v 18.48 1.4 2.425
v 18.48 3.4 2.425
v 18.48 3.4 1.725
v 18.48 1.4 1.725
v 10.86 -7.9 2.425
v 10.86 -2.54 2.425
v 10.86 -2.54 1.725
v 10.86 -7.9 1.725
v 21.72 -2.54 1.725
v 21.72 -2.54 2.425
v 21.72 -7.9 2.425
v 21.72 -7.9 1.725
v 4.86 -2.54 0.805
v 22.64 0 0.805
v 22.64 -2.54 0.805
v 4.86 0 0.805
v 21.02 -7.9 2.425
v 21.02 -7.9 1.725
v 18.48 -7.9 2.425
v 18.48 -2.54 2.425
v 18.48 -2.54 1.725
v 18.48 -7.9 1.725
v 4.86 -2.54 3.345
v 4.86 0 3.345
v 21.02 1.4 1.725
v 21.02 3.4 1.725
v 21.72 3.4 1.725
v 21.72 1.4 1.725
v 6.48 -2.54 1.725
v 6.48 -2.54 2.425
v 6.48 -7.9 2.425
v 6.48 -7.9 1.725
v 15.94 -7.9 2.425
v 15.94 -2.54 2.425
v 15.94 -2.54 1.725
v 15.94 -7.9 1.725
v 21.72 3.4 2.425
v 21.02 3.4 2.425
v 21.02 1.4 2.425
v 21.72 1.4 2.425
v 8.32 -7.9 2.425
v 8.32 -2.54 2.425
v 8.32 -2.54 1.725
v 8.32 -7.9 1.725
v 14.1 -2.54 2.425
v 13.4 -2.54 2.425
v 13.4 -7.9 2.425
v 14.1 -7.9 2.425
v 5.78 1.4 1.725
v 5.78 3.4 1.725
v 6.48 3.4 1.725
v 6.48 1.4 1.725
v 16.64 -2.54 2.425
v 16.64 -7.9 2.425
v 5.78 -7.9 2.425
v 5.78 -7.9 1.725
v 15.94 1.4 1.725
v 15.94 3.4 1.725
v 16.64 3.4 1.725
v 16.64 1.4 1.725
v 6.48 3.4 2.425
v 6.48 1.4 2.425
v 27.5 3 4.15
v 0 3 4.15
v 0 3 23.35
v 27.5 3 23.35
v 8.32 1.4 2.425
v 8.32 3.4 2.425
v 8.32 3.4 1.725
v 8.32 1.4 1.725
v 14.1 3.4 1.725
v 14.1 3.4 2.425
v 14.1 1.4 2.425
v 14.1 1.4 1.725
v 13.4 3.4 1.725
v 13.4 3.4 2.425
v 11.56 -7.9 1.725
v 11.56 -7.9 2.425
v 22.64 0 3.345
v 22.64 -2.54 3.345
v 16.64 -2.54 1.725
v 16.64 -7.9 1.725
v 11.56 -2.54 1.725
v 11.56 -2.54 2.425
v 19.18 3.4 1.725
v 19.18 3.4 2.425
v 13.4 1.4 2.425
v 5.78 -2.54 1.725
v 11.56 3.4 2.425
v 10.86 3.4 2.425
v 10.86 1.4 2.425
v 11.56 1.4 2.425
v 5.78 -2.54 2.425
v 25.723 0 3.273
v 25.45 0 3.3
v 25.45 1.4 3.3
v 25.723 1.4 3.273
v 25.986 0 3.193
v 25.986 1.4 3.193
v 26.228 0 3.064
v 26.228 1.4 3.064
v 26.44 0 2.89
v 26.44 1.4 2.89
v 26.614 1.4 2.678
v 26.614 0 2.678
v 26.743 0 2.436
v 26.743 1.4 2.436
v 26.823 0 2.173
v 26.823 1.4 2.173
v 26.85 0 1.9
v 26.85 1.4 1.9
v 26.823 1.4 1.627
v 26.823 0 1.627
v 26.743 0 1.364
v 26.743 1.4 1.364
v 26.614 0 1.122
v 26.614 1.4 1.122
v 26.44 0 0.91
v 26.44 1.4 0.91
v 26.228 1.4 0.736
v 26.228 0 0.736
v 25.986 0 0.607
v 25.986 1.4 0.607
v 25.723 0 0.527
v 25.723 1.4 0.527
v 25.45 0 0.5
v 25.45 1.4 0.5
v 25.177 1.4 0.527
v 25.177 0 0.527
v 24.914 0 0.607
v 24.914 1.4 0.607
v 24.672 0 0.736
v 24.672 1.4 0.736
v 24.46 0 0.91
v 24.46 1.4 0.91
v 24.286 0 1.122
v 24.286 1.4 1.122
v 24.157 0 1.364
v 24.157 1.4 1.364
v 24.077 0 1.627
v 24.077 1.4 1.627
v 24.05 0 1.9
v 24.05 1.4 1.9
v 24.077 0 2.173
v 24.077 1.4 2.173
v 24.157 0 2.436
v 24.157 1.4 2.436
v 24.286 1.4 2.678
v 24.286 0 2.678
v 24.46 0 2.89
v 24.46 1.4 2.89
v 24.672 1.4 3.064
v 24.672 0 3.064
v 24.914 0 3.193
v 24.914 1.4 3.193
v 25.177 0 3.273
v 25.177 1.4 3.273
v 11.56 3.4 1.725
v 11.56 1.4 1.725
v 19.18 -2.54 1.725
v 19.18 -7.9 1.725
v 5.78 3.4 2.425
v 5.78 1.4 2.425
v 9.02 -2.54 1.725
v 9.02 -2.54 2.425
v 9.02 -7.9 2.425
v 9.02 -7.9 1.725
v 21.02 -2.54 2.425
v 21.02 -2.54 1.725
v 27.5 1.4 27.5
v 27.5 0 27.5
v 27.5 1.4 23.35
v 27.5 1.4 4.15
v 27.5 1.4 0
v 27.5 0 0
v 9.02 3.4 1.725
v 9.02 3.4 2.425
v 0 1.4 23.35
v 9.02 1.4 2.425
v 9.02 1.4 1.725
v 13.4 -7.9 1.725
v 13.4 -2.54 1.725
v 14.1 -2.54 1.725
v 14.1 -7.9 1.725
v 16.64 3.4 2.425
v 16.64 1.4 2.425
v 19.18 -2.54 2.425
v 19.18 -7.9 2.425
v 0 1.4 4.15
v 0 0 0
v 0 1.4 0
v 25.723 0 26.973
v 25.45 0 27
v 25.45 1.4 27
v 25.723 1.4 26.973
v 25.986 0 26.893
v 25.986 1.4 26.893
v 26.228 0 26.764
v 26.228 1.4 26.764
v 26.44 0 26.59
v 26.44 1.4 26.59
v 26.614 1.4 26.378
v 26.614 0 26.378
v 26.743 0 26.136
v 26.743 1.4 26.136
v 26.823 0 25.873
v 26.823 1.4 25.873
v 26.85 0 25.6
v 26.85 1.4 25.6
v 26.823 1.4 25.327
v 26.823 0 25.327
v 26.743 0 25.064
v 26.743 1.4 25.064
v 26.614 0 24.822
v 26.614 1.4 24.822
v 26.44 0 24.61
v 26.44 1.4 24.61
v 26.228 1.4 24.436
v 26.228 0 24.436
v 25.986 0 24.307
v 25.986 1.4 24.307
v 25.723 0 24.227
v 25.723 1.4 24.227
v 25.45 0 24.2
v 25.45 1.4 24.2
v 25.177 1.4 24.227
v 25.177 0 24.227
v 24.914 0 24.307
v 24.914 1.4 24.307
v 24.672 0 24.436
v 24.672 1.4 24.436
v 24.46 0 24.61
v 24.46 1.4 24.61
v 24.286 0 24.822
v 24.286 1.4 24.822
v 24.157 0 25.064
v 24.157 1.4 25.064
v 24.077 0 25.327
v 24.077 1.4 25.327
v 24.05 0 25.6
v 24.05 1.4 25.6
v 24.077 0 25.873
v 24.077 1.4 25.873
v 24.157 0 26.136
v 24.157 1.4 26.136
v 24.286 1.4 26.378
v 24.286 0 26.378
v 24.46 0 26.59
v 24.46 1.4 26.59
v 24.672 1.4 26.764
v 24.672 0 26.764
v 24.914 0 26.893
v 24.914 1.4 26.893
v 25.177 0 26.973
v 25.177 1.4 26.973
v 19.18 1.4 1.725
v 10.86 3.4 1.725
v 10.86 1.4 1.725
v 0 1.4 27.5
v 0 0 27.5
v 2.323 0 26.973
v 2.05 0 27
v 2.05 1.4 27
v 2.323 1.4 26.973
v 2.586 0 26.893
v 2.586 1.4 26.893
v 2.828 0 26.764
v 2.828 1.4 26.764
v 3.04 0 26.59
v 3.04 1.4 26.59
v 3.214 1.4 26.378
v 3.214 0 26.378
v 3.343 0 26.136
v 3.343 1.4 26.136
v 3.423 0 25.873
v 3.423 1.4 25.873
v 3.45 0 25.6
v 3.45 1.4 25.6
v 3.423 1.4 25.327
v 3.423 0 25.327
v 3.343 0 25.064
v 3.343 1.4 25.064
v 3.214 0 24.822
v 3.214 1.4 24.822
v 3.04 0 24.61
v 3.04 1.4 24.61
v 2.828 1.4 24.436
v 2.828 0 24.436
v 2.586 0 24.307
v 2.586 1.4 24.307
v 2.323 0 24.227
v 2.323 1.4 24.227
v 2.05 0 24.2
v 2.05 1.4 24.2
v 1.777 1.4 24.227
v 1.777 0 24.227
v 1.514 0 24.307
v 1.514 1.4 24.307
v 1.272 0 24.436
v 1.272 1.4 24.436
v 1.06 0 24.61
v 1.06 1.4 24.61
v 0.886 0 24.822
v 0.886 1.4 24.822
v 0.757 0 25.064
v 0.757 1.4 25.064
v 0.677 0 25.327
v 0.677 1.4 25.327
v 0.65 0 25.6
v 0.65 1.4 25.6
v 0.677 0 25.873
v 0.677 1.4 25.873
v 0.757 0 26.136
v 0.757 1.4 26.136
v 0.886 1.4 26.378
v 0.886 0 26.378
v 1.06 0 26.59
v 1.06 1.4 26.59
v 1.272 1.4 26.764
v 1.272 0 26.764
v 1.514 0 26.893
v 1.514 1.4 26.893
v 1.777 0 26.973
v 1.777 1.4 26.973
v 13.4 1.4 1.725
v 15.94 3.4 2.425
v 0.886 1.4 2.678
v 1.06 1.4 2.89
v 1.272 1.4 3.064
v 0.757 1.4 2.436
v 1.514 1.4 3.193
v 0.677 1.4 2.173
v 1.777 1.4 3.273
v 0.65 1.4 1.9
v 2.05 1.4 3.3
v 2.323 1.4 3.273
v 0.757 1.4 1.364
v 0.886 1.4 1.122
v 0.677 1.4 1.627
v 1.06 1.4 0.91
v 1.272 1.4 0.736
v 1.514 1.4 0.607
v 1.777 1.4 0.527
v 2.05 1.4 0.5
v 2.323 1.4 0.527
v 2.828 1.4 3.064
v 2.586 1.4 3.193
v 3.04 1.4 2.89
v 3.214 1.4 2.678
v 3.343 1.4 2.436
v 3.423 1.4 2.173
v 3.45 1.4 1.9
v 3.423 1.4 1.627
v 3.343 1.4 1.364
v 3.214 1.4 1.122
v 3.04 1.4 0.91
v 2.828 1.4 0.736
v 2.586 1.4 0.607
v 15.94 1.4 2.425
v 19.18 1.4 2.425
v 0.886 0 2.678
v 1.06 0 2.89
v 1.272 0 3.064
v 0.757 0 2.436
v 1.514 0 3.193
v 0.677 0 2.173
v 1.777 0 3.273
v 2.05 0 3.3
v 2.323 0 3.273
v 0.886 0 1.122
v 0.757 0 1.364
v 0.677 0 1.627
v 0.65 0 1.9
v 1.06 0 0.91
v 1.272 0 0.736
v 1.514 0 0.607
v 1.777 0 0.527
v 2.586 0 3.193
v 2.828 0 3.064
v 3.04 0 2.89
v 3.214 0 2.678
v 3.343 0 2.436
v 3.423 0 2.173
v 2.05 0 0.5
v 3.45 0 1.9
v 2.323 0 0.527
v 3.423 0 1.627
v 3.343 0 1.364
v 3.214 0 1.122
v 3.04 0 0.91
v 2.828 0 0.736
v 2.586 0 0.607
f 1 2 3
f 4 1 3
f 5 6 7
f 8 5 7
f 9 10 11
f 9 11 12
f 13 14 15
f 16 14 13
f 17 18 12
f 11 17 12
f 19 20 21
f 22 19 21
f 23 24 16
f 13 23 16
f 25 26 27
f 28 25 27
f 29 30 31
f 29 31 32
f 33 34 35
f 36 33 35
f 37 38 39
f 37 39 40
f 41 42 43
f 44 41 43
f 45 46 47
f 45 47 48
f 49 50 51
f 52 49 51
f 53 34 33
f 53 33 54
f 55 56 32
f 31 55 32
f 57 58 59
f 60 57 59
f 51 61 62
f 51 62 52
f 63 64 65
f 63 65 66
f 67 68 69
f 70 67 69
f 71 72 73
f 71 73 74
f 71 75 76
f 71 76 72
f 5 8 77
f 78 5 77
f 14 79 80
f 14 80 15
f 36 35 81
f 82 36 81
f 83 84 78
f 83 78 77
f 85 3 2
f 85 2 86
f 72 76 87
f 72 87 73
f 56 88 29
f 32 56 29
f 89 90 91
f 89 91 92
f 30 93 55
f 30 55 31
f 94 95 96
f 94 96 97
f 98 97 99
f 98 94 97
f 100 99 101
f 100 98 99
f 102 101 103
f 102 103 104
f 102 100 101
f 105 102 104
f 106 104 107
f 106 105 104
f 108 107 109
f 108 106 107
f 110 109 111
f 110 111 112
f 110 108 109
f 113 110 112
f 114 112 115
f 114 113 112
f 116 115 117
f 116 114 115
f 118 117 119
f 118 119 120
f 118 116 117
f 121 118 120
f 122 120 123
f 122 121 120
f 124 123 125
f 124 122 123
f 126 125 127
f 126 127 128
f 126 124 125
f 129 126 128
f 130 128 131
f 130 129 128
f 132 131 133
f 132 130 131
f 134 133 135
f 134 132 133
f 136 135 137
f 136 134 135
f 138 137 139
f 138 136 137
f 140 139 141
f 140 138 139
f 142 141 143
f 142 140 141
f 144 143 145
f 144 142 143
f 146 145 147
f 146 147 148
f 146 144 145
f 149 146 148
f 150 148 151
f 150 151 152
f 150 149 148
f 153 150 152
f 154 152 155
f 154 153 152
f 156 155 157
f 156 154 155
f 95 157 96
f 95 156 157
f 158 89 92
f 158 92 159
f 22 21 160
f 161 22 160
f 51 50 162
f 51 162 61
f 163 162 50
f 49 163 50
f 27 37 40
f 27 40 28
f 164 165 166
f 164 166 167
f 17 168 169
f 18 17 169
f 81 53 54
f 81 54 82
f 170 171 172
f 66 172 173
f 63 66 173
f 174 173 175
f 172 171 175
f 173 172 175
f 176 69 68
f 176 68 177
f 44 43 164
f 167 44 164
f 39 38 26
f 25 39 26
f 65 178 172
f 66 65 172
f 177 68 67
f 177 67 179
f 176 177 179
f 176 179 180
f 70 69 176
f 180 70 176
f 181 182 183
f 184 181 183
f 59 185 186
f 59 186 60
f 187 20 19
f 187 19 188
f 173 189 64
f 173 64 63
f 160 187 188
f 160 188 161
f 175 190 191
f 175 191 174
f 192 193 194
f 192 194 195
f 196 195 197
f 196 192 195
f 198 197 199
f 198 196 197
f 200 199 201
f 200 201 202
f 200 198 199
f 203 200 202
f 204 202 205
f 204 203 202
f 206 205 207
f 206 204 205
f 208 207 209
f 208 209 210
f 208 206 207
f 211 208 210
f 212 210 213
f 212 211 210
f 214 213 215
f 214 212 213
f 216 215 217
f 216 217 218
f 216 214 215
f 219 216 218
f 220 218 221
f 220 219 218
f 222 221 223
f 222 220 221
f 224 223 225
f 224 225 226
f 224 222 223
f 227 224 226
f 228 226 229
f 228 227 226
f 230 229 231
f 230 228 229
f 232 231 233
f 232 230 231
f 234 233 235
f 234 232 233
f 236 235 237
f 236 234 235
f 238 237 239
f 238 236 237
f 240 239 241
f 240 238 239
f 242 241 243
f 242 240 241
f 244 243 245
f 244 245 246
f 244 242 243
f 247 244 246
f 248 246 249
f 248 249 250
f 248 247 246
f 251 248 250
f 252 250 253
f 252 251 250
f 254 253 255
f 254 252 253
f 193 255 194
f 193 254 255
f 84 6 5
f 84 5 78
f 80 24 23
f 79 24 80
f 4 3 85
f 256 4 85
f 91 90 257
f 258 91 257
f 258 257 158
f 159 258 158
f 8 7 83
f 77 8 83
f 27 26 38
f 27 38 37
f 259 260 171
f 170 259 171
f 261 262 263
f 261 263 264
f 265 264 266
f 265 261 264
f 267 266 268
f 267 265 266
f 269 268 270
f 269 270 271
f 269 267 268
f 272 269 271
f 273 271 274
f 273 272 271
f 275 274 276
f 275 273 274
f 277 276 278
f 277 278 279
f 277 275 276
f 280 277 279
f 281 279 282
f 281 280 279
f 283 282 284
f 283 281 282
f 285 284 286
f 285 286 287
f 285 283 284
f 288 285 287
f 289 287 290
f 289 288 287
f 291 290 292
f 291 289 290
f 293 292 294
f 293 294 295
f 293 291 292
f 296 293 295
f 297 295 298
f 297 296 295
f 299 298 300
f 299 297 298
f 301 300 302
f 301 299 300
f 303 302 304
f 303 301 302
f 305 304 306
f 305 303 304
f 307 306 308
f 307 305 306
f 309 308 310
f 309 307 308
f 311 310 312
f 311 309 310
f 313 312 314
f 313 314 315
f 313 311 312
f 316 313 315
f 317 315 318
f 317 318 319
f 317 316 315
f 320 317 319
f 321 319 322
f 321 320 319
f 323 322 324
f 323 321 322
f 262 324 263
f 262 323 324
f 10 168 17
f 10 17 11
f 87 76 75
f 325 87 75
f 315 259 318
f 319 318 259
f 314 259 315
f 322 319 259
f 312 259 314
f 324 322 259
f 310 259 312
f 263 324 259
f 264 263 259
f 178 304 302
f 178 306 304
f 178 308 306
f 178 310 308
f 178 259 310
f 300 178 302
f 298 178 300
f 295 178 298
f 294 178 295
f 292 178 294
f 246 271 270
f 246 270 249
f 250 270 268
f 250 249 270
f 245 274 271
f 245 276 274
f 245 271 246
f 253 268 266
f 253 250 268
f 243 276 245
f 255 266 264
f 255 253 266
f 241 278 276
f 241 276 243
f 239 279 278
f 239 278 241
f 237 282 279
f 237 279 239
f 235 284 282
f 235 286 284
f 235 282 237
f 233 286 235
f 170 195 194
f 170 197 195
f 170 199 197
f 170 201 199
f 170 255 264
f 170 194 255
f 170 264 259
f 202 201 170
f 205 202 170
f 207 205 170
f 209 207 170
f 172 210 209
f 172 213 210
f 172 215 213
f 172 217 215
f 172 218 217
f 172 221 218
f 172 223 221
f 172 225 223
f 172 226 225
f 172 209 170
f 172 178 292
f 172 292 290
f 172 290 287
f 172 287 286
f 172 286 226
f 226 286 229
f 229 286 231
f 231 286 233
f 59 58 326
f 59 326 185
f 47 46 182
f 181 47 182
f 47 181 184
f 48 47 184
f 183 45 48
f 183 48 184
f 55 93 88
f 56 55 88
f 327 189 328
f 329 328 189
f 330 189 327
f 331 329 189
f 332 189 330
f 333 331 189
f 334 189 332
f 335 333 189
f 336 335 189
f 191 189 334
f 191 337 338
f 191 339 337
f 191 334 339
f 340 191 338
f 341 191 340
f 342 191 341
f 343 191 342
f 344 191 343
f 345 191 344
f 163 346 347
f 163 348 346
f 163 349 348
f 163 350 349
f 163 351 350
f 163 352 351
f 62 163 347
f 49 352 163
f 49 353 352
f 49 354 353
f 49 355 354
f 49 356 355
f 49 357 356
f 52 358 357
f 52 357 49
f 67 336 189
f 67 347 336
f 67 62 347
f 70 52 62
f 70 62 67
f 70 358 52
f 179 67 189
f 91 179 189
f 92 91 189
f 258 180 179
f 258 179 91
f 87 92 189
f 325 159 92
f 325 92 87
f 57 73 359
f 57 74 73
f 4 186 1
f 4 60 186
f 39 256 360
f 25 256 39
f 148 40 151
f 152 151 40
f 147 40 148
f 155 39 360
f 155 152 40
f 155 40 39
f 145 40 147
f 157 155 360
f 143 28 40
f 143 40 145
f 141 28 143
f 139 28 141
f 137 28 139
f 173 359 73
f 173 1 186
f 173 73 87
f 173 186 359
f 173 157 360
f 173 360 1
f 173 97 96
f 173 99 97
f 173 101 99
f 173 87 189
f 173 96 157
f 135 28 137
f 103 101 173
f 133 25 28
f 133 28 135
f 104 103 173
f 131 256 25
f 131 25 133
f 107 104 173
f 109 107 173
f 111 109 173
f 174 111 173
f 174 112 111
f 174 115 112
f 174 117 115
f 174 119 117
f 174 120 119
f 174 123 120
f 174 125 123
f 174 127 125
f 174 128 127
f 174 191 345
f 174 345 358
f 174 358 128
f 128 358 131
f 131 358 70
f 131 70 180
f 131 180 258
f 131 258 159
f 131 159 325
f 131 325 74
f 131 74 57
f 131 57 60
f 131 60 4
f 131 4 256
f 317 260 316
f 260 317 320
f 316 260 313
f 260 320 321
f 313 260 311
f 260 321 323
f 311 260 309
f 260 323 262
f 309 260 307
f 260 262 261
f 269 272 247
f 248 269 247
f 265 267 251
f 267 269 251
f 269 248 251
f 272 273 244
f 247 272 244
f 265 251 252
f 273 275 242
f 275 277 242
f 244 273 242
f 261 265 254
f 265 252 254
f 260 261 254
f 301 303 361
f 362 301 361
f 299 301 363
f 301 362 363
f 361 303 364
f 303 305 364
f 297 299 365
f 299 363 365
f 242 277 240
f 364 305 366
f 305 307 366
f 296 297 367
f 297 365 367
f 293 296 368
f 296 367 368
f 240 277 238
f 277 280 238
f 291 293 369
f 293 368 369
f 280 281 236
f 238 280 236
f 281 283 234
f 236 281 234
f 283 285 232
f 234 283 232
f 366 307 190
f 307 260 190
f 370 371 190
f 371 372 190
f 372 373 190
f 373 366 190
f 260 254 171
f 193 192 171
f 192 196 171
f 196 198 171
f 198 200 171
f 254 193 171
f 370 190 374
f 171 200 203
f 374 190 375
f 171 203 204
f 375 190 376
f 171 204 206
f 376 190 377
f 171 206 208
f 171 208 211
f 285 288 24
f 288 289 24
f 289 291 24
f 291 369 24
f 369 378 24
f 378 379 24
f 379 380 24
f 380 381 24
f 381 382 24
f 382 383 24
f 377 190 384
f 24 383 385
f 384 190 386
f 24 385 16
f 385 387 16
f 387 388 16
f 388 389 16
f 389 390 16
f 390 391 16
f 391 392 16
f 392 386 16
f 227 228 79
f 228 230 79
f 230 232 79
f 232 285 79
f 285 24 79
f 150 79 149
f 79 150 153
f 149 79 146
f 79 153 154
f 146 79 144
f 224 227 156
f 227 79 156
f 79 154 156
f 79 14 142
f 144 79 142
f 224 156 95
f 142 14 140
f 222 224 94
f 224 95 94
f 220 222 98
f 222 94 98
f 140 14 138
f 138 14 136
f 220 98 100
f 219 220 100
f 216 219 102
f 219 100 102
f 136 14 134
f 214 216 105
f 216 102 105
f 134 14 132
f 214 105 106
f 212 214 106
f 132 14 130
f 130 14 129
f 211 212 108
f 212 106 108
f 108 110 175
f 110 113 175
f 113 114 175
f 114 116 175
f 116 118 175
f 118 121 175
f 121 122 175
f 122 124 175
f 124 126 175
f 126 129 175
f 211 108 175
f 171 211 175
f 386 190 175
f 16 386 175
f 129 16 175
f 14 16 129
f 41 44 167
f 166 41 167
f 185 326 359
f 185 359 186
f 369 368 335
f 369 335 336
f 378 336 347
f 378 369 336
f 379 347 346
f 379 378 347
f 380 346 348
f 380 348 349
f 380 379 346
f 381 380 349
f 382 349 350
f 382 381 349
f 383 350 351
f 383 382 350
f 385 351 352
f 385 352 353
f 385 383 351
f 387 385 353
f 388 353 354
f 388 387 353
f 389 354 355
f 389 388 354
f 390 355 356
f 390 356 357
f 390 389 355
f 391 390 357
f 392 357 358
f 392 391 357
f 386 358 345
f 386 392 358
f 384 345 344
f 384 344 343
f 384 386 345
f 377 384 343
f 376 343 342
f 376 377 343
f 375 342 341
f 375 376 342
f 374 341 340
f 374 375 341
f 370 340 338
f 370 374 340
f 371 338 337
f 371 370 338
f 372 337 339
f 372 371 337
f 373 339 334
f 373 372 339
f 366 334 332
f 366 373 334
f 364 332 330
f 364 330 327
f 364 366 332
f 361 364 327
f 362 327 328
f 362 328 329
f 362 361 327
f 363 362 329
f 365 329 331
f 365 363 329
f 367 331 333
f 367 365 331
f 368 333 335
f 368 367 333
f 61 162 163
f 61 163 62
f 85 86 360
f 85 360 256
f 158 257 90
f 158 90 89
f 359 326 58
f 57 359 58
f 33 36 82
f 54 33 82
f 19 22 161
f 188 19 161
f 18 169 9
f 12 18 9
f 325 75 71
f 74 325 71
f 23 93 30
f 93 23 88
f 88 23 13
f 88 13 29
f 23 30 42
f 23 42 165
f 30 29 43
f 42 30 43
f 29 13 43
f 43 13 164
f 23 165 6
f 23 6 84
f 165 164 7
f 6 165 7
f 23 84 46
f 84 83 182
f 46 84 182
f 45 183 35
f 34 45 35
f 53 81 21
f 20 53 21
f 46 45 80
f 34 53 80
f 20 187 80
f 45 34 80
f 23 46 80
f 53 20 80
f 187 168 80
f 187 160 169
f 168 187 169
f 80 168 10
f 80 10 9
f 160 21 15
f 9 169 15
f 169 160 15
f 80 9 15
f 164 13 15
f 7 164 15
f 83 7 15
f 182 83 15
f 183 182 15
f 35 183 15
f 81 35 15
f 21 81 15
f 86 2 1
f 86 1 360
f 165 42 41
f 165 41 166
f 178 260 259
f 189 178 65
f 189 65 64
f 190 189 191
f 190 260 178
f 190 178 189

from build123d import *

# Parameters (mm, degrees)
SKETCH_1_W      = 27.5
SKETCH_1_H      = 27.5
SKETCH_1_R      = 1.4
EXTRUDE_1_DEPTH = 1.4
SKETCH_1_3_W    = 27.5
SKETCH_1_3_H    = 19.2
EXTRUDE_2_DEPTH = 3
SKETCH_1_4_W    = 2.54
SKETCH_1_4_H    = 2.54
EXTRUDE_3_DEPTH = 2.54
EXTRUDE_START   = 3.4
SKETCH_1_5_W    = 0.7
SKETCH_1_5_H    = 0.7
EXTRUDE_4_DEPTH = 11.3


with BuildPart() as part:
    # 草图1 → 凸台-拉伸1 (new body)
    with BuildSketch(Plane(origin=(0, 0, 0), x_dir=(1, 0, 0), z_dir=(0, 1, 0))):
        with Locations((13.75, -13.75)):
            Rectangle(SKETCH_1_W, SKETCH_1_H)
        with Locations((2.05, -1.9)):
            Circle(SKETCH_1_R, mode=Mode.SUBTRACT)
        with Locations((25.45, -1.9)):
            Circle(SKETCH_1_R, mode=Mode.SUBTRACT)
        with Locations((2.05, -25.6)):
            Circle(SKETCH_1_R, mode=Mode.SUBTRACT)
        with Locations((25.45, -25.6)):
            Circle(SKETCH_1_R, mode=Mode.SUBTRACT)
    extrude(amount=EXTRUDE_1_DEPTH)

    # 草图1<3> → 凸台-拉伸2 (add)
    with BuildSketch(Plane(origin=(0, 0, 0), x_dir=(1, 0, 0), z_dir=(0, 1, 0))):
        with Locations((13.75, -13.75)):
            Rectangle(SKETCH_1_3_W, SKETCH_1_3_H)
    extrude(amount=EXTRUDE_2_DEPTH)

    # 草图1<4> → 凸台-拉伸3 (add)
    with BuildSketch(Plane(origin=(0, 0, 0), x_dir=(1, 0, 0), z_dir=(0, 1, 0))):
        with Locations((6.13, -2.075)):
            Rectangle(SKETCH_1_4_W, SKETCH_1_4_H)
        with Locations((8.67, -2.075)):
            Rectangle(SKETCH_1_4_W, SKETCH_1_4_H)
        with Locations((11.21, -2.075)):
            Rectangle(SKETCH_1_4_W, SKETCH_1_4_H)
        with Locations((13.75, -2.075)):
            Rectangle(SKETCH_1_4_W, SKETCH_1_4_H)
        with Locations((16.29, -2.075)):
            Rectangle(SKETCH_1_4_W, SKETCH_1_4_H)
        with Locations((18.83, -2.075)):
            Rectangle(SKETCH_1_4_W, SKETCH_1_4_H)
        with Locations((21.37, -2.075)):
            Rectangle(SKETCH_1_4_W, SKETCH_1_4_H)
    extrude(amount=-EXTRUDE_3_DEPTH)

    # 草图1<5> → 凸台-拉伸4 (add)
    with BuildSketch(Plane(origin=(0, 0, 0), x_dir=(1, 0, 0), z_dir=(0, 1, 0)).offset(EXTRUDE_START)):
        with Locations((6.13, -2.075)):
            Rectangle(SKETCH_1_5_W, SKETCH_1_5_H)
        with Locations((8.67, -2.075)):
            Rectangle(SKETCH_1_5_W, SKETCH_1_5_H)
        with Locations((11.21, -2.075)):
            Rectangle(SKETCH_1_5_W, SKETCH_1_5_H)
        with Locations((13.75, -2.075)):
            Rectangle(SKETCH_1_5_W, SKETCH_1_5_H)
        with Locations((16.29, -2.075)):
            Rectangle(SKETCH_1_5_W, SKETCH_1_5_H)
        with Locations((18.83, -2.075)):
            Rectangle(SKETCH_1_5_W, SKETCH_1_5_H)
        with Locations((21.37, -2.075)):
            Rectangle(SKETCH_1_5_W, SKETCH_1_5_H)
    extrude(amount=-EXTRUDE_4_DEPTH)


solid = part.part
